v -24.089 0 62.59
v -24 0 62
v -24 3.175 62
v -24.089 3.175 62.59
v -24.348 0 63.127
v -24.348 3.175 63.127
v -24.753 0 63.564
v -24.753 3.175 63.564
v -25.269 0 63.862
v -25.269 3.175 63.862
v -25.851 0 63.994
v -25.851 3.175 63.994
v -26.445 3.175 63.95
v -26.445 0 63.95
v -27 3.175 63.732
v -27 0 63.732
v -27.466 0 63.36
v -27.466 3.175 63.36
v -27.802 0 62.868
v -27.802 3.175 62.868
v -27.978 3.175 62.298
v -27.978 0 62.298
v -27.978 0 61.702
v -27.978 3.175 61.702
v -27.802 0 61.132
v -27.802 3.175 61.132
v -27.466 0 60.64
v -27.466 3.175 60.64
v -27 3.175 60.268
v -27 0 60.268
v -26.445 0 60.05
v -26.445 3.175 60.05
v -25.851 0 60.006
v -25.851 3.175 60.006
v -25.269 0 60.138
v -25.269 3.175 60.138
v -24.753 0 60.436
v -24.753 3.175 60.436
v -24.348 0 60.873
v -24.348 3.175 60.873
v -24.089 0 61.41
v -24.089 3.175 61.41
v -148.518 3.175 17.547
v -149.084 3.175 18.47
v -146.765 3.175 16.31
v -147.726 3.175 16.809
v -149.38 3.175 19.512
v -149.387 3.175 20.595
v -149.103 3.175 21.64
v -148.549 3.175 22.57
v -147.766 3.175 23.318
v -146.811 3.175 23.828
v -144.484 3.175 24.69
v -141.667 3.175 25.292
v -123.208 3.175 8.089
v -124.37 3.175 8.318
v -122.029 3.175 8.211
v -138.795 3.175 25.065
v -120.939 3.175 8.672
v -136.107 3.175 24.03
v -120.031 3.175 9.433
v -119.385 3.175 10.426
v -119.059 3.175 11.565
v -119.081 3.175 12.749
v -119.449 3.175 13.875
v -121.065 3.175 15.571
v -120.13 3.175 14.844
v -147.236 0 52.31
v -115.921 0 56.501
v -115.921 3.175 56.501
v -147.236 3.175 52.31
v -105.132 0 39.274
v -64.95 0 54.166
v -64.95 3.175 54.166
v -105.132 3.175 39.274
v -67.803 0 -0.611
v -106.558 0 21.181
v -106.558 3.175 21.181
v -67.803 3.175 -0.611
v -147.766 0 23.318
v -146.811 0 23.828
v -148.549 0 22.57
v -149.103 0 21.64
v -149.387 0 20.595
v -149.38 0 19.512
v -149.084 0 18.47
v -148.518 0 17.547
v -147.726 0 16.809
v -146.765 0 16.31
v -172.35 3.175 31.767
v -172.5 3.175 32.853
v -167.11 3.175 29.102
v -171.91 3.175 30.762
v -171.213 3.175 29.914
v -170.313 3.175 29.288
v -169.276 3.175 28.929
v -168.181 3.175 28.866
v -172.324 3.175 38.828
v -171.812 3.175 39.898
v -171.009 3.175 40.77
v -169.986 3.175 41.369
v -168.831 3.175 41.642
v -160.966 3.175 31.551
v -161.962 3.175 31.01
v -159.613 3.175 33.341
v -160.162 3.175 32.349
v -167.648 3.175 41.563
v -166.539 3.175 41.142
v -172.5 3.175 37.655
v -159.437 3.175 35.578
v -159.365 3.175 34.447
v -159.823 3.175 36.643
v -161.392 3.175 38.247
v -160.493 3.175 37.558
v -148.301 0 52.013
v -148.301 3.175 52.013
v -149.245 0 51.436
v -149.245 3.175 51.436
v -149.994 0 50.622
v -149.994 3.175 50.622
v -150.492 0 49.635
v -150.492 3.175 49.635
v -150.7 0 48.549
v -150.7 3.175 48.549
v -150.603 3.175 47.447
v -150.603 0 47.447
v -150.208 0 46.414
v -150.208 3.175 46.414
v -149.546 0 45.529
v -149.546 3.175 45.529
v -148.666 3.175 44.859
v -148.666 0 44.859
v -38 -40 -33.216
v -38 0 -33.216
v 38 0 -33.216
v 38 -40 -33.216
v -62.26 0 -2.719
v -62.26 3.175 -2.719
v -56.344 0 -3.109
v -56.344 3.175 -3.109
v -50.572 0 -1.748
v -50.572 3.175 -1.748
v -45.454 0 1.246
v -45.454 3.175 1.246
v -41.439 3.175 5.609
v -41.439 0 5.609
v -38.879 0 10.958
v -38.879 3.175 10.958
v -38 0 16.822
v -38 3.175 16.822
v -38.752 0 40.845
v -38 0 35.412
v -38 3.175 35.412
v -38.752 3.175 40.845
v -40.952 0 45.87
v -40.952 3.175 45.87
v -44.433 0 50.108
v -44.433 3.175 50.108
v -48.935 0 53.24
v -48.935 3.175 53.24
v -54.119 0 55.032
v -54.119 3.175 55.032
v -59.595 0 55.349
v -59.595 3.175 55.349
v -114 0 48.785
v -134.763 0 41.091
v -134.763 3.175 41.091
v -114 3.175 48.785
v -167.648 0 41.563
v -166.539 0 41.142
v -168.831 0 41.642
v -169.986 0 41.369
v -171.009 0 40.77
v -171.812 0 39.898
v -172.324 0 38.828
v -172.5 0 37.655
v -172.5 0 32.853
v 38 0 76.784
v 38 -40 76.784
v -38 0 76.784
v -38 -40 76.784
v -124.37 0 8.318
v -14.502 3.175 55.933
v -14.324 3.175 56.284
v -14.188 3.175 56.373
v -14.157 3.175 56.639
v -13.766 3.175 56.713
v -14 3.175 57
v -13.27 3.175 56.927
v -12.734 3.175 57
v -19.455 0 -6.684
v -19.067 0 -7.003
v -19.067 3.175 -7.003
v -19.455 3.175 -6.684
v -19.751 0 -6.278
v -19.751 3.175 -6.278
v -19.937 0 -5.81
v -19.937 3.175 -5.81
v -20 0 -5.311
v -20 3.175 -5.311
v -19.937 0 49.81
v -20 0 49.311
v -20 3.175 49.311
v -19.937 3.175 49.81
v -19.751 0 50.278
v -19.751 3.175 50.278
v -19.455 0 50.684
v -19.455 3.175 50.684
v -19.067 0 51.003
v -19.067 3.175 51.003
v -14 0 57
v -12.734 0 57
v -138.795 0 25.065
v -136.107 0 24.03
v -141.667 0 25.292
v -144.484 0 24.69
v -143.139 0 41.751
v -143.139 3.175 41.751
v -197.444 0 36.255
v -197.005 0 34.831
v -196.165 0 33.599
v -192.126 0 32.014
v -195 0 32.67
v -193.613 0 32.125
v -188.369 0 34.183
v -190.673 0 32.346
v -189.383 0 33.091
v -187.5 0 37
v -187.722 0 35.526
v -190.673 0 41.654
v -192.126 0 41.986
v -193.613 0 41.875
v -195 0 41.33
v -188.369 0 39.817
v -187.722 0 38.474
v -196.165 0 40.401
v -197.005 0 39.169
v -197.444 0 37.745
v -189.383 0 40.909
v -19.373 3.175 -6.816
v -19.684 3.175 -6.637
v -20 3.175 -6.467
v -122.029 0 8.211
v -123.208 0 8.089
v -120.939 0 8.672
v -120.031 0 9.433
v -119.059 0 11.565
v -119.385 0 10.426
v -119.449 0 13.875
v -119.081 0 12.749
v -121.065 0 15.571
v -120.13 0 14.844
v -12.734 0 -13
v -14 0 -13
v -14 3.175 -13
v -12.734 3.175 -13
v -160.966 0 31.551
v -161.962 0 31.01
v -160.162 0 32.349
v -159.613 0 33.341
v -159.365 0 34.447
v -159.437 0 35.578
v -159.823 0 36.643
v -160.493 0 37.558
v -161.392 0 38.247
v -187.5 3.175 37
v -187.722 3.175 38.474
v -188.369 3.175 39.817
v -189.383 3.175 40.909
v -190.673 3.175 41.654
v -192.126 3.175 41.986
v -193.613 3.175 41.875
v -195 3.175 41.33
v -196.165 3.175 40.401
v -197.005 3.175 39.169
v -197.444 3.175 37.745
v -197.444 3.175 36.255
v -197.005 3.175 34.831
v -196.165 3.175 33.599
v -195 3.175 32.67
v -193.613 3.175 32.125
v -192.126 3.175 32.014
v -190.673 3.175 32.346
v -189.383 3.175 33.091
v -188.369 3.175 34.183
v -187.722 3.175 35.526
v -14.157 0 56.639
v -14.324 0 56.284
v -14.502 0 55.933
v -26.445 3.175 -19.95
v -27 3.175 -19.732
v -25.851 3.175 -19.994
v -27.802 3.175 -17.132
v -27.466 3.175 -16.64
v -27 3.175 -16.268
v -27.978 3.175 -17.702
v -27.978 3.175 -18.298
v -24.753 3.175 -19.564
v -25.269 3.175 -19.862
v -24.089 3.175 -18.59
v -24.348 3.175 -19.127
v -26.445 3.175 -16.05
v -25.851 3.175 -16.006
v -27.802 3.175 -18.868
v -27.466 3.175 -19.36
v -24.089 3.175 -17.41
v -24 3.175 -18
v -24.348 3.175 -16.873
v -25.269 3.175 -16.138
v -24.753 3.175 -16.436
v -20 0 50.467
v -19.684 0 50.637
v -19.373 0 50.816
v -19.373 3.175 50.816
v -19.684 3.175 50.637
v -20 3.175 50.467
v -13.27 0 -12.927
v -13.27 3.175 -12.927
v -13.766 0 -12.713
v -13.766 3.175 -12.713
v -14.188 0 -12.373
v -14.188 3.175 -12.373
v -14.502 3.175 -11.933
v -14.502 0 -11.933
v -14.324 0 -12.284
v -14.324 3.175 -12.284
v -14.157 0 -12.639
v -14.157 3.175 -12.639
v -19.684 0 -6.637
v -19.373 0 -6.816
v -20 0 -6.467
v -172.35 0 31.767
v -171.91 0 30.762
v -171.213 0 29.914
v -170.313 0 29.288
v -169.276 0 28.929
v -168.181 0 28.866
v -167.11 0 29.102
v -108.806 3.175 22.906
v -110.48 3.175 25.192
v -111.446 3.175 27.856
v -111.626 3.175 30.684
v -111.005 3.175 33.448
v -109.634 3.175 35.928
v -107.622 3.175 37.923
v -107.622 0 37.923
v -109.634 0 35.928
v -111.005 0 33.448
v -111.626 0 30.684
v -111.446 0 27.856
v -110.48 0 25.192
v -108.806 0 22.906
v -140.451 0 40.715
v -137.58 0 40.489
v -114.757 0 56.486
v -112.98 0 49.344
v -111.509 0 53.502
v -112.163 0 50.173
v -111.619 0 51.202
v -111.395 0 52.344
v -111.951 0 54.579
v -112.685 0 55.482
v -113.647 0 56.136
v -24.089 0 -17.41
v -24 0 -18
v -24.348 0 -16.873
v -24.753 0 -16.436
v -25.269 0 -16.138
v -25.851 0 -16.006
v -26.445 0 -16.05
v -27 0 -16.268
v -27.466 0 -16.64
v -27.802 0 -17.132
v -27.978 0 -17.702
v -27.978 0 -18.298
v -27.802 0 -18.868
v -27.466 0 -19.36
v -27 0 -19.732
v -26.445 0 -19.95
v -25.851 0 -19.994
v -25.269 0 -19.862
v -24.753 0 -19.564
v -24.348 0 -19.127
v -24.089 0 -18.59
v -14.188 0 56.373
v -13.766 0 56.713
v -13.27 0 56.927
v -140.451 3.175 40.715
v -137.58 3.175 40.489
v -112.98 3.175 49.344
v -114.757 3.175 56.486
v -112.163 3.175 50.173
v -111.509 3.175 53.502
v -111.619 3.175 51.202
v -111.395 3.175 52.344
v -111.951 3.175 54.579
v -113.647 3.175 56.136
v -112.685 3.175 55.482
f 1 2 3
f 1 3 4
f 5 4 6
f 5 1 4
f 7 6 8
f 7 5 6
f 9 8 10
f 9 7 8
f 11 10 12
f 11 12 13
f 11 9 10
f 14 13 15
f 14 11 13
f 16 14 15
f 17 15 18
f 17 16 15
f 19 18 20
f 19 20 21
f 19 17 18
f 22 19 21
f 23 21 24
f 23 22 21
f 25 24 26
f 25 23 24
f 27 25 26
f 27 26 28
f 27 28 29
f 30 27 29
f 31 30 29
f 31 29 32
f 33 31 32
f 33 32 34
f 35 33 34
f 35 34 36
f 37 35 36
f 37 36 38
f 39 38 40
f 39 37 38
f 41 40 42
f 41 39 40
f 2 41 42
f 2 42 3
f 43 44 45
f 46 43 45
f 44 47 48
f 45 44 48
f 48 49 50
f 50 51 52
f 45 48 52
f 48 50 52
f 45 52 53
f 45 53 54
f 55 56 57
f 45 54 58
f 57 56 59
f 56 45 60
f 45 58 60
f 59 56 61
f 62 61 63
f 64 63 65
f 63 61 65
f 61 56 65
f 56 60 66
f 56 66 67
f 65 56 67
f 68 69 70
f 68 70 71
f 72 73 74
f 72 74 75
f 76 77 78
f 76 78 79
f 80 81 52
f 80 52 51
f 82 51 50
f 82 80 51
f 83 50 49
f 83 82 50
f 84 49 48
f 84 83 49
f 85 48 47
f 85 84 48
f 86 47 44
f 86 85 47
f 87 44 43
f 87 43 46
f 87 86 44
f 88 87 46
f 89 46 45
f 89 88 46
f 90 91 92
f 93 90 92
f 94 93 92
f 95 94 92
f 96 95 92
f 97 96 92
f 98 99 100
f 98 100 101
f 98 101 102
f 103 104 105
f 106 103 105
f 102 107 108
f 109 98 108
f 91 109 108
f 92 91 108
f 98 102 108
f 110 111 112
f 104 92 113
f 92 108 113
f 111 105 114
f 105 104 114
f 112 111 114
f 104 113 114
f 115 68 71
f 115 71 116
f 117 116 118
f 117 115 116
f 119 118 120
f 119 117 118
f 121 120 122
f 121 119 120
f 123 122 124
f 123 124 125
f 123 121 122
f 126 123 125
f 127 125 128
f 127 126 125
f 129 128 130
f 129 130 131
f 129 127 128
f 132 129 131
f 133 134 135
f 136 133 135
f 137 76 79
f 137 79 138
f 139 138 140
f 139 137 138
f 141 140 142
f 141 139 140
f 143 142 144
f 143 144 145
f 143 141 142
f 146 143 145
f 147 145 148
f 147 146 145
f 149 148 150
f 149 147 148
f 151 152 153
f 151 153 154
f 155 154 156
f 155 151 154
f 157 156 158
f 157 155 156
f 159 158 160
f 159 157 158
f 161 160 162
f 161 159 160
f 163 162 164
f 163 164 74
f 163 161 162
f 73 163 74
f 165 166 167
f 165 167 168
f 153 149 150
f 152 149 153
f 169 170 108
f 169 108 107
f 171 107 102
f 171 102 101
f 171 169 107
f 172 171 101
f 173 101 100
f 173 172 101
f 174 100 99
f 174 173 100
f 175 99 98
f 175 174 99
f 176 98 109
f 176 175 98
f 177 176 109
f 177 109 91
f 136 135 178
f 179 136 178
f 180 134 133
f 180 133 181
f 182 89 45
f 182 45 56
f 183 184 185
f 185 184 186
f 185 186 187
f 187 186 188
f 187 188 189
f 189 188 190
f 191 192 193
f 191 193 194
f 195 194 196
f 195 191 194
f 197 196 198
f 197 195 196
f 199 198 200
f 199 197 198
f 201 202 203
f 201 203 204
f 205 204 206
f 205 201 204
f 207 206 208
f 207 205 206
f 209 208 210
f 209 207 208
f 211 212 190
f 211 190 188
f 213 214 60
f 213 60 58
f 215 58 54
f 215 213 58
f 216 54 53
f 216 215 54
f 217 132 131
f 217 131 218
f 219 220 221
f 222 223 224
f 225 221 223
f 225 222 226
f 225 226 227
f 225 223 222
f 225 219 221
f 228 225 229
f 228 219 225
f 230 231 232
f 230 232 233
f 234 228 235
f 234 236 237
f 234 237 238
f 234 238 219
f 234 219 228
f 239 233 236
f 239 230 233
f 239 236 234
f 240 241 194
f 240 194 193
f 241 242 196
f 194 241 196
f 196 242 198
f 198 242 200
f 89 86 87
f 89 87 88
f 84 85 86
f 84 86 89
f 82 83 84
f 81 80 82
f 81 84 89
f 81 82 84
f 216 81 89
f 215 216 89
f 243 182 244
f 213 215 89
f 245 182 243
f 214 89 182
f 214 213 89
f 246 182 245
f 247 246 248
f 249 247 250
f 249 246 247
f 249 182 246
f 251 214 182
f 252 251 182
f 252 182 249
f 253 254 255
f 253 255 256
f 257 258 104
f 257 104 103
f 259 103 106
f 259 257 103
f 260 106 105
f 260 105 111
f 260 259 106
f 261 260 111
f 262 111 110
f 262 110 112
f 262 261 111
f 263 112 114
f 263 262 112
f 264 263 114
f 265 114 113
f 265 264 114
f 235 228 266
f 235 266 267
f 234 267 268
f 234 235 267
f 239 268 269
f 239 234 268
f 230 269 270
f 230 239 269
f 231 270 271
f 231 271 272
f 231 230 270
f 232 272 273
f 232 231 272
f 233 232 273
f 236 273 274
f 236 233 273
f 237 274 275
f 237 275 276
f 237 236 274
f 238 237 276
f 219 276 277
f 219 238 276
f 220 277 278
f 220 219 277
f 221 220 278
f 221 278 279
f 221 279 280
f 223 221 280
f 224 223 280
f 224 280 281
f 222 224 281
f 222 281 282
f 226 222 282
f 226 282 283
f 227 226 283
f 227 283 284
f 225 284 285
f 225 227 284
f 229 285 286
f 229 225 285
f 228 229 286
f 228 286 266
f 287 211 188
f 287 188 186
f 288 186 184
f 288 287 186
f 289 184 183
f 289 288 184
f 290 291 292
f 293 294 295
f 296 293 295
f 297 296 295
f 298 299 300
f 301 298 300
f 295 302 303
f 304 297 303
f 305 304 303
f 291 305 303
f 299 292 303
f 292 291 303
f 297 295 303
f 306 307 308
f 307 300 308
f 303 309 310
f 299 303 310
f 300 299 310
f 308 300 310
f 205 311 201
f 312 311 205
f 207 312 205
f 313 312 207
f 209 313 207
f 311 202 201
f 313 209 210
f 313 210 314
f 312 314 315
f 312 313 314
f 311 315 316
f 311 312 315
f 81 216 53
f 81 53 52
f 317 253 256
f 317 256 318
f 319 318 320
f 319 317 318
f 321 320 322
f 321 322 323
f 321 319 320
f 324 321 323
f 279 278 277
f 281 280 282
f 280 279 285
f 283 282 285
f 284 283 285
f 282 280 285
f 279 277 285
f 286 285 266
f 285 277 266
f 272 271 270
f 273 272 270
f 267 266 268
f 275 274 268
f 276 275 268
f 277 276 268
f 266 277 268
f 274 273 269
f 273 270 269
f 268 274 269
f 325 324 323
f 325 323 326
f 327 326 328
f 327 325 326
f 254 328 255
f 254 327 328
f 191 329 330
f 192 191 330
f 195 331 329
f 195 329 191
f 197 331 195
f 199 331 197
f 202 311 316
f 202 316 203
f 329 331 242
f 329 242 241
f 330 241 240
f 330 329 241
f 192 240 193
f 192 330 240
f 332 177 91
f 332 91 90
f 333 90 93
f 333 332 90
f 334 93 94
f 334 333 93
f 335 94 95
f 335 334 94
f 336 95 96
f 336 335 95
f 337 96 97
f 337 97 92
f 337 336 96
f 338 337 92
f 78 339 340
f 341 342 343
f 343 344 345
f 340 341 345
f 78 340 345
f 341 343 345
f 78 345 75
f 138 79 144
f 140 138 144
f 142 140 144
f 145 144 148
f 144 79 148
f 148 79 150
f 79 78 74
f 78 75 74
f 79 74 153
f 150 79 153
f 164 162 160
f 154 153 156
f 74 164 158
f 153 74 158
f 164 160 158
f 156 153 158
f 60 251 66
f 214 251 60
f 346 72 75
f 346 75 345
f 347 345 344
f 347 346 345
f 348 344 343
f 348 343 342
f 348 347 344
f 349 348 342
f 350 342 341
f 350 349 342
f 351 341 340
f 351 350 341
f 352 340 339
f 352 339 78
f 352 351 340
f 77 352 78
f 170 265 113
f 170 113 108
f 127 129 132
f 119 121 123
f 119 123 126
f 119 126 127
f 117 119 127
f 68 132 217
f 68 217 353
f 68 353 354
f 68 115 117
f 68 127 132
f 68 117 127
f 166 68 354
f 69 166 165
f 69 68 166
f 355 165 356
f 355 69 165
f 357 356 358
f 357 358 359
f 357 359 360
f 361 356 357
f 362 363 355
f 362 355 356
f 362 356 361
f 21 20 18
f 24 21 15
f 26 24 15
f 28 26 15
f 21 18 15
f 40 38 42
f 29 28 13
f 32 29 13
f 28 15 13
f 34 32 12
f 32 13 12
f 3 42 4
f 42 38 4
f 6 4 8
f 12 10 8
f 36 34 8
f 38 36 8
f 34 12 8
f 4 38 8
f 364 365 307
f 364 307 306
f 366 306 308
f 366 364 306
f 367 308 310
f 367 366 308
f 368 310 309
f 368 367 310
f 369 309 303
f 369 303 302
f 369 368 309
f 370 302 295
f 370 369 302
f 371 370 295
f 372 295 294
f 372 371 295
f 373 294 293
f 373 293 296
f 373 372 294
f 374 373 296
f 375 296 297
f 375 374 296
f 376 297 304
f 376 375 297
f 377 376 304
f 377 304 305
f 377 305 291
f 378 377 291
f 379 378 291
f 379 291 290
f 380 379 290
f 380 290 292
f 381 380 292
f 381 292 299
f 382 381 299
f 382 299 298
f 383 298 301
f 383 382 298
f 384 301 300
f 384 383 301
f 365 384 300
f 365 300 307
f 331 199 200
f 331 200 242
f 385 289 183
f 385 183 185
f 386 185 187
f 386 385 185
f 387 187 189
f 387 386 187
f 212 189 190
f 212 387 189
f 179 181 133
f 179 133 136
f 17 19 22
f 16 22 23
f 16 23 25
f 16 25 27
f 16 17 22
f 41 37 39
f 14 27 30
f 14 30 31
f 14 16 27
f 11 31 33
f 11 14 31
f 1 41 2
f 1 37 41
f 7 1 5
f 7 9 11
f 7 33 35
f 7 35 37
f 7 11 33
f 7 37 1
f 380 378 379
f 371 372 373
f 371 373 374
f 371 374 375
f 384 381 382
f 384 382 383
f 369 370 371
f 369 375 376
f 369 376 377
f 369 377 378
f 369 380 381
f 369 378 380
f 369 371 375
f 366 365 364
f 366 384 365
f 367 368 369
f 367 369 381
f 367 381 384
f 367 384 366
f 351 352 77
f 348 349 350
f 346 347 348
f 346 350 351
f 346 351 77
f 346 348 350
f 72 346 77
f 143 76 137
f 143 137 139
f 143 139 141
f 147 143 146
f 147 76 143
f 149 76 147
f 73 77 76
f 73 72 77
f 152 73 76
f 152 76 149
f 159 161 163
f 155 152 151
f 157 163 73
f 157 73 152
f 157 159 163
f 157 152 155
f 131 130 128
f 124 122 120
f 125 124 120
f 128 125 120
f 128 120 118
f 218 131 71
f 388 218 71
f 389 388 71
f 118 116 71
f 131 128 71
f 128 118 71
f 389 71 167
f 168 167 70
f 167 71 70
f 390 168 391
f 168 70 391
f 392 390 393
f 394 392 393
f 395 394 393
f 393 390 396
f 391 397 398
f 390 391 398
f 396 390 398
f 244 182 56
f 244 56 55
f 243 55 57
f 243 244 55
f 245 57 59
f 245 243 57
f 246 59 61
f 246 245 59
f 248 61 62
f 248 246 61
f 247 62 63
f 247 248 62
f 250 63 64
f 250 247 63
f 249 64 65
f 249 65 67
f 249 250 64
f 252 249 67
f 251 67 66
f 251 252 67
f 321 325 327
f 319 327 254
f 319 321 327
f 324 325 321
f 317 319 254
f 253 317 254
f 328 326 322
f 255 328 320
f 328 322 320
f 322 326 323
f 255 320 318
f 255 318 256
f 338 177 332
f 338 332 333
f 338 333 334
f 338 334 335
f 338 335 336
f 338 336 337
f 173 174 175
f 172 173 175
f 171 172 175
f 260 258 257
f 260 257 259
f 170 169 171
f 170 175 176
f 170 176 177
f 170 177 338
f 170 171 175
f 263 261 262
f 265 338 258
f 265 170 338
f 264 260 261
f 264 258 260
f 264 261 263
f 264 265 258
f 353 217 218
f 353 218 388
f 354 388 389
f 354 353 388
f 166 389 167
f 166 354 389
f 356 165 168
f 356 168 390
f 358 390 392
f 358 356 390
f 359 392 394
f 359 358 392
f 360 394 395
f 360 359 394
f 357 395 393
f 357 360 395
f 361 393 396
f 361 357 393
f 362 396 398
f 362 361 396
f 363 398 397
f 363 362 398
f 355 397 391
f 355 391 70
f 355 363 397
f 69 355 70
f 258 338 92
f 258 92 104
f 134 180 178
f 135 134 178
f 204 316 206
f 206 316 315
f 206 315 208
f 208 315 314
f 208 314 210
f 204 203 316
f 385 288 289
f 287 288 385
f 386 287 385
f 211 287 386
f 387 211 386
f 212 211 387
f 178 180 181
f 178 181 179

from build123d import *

# Parameters (mm, degrees)
F0_R     = 5
F0_R_2   = 2
F1_DEPTH = 3.175
F2_W     = 76
F2_H     = 110
F3_DEPTH = 40


with BuildPart() as f1:
    # F0 (on Front) → F1 (new body)
    with BuildSketch(Plane.XZ):
        with Locations((-192.5, 37)):
            Circle(F0_R)
        with Locations((-26, 62)):
            Circle(F0_R_2)
        with Locations((-26, -18)):
            Circle(F0_R_2)
        with BuildLine():
            ThreePointArc((-166.539484, 41.141899), (-170.519645, 41.107984), (-172.5, 37.6553))
            Line((-172.5, 37.6553), (-172.5, 32.853158))
            ThreePointArc((-172.5, 32.853158), (-170.784715, 29.569855), (-167.109962, 29.102452))
            Line((-167.109962, 29.102452), (-161.962461, 31.010152))
            ThreePointArc((-161.962461, 31.010152), (-159.364868, 34.446534), (-161.391983, 38.247457))
            Line((-161.391983, 38.247457), (-166.539484, 41.141899))
        make_face()
        with BuildLine():
            Line((-38, 16.8221), (-38, 35.412461))
            ThreePointArc((-38, 35.412461), (-46.576423, 51.828974), (-64.95019, 54.16599))
            Line((-64.95019, 54.16599), (-105.131645, 39.274461))
            ThreePointArc((-105.131645, 39.274461), (-111.625628, 30.683505), (-106.55784, 21.181197))
            Line((-106.55784, 21.181197), (-67.80258, -0.610898))
            ThreePointArc((-67.80258, -0.610898), (-47.901773, -0.441324), (-38, 16.8221))
        make_face()
        with BuildLine():
            Line((-148.665773, 44.858501), (-143.139082, 41.750841))
            ThreePointArc((-143.139082, 41.750841), (-139.023601, 40.498263), (-134.762697, 41.090575))
            Line((-134.762697, 41.090575), (-114.000415, 48.785223))
            ThreePointArc((-114.000415, 48.785223), (-111.508912, 53.502181), (-115.921039, 56.500583))
            Line((-115.921039, 56.500583), (-147.235842, 52.309754))
            ThreePointArc((-147.235842, 52.309754), (-150.633576, 49.098963), (-148.665773, 44.858501))
        make_face()
        with BuildLine():
            Line((-121.06485, 15.571498), (-136.107493, 24.029981))
            ThreePointArc((-136.107493, 24.029981), (-140.222974, 25.282559), (-144.483878, 24.690246))
            Line((-144.483878, 24.690246), (-146.810607, 23.827944))
            ThreePointArc((-146.810607, 23.827944), (-149.420496, 20.052988), (-146.765027, 16.309954))
            Line((-146.765027, 16.309954), (-124.369825, 8.317614))
            ThreePointArc((-124.369825, 8.317614), (-119.385368, 10.426462), (-121.06485, 15.571498))
        make_face()
        with BuildLine():
            ThreePointArc((-14, 57), (-14.239085, 56.460968), (-14.502367, 55.933333))
            ThreePointArc((-14.502367, 55.933333), (-13.766296, 56.712698), (-12.733501, 57))
            Line((-12.733501, 57), (-14, 57))
        make_face()
        with BuildLine():
            ThreePointArc((-12.733501, -13), (-13.766296, -12.712698), (-14.502367, -11.933333))
            ThreePointArc((-14.502367, -11.933333), (-14.239085, -12.460968), (-14, -13))
            Line((-14, -13), (-12.733501, -13))
        make_face()
        with BuildLine():
            ThreePointArc((-19.066667, -7.003233), (-19.75119, -6.277514), (-20, -5.311422))
            Line((-20, -5.311422), (-20, -6.467437))
            ThreePointArc((-20, -6.467437), (-19.527787, -6.725673), (-19.066667, -7.003233))
        make_face()
        with BuildLine():
            ThreePointArc((-19.066667, 51.003233), (-19.527787, 50.725673), (-20, 50.467437))
            Line((-20, 50.467437), (-20, 49.311422))
            ThreePointArc((-20, 49.311422), (-19.75119, 50.277514), (-19.066667, 51.003233))
        make_face()
    extrude(amount=-F1_DEPTH)


with BuildPart() as f3:
    # F2 (on Front) → F3 (new body)
    with BuildSketch(Plane.XZ):
        with Locations((0, 21.784008)):
            Rectangle(F2_W, F2_H)
    extrude(amount=F3_DEPTH)


solid = Compound([f1.part, f3.part])
